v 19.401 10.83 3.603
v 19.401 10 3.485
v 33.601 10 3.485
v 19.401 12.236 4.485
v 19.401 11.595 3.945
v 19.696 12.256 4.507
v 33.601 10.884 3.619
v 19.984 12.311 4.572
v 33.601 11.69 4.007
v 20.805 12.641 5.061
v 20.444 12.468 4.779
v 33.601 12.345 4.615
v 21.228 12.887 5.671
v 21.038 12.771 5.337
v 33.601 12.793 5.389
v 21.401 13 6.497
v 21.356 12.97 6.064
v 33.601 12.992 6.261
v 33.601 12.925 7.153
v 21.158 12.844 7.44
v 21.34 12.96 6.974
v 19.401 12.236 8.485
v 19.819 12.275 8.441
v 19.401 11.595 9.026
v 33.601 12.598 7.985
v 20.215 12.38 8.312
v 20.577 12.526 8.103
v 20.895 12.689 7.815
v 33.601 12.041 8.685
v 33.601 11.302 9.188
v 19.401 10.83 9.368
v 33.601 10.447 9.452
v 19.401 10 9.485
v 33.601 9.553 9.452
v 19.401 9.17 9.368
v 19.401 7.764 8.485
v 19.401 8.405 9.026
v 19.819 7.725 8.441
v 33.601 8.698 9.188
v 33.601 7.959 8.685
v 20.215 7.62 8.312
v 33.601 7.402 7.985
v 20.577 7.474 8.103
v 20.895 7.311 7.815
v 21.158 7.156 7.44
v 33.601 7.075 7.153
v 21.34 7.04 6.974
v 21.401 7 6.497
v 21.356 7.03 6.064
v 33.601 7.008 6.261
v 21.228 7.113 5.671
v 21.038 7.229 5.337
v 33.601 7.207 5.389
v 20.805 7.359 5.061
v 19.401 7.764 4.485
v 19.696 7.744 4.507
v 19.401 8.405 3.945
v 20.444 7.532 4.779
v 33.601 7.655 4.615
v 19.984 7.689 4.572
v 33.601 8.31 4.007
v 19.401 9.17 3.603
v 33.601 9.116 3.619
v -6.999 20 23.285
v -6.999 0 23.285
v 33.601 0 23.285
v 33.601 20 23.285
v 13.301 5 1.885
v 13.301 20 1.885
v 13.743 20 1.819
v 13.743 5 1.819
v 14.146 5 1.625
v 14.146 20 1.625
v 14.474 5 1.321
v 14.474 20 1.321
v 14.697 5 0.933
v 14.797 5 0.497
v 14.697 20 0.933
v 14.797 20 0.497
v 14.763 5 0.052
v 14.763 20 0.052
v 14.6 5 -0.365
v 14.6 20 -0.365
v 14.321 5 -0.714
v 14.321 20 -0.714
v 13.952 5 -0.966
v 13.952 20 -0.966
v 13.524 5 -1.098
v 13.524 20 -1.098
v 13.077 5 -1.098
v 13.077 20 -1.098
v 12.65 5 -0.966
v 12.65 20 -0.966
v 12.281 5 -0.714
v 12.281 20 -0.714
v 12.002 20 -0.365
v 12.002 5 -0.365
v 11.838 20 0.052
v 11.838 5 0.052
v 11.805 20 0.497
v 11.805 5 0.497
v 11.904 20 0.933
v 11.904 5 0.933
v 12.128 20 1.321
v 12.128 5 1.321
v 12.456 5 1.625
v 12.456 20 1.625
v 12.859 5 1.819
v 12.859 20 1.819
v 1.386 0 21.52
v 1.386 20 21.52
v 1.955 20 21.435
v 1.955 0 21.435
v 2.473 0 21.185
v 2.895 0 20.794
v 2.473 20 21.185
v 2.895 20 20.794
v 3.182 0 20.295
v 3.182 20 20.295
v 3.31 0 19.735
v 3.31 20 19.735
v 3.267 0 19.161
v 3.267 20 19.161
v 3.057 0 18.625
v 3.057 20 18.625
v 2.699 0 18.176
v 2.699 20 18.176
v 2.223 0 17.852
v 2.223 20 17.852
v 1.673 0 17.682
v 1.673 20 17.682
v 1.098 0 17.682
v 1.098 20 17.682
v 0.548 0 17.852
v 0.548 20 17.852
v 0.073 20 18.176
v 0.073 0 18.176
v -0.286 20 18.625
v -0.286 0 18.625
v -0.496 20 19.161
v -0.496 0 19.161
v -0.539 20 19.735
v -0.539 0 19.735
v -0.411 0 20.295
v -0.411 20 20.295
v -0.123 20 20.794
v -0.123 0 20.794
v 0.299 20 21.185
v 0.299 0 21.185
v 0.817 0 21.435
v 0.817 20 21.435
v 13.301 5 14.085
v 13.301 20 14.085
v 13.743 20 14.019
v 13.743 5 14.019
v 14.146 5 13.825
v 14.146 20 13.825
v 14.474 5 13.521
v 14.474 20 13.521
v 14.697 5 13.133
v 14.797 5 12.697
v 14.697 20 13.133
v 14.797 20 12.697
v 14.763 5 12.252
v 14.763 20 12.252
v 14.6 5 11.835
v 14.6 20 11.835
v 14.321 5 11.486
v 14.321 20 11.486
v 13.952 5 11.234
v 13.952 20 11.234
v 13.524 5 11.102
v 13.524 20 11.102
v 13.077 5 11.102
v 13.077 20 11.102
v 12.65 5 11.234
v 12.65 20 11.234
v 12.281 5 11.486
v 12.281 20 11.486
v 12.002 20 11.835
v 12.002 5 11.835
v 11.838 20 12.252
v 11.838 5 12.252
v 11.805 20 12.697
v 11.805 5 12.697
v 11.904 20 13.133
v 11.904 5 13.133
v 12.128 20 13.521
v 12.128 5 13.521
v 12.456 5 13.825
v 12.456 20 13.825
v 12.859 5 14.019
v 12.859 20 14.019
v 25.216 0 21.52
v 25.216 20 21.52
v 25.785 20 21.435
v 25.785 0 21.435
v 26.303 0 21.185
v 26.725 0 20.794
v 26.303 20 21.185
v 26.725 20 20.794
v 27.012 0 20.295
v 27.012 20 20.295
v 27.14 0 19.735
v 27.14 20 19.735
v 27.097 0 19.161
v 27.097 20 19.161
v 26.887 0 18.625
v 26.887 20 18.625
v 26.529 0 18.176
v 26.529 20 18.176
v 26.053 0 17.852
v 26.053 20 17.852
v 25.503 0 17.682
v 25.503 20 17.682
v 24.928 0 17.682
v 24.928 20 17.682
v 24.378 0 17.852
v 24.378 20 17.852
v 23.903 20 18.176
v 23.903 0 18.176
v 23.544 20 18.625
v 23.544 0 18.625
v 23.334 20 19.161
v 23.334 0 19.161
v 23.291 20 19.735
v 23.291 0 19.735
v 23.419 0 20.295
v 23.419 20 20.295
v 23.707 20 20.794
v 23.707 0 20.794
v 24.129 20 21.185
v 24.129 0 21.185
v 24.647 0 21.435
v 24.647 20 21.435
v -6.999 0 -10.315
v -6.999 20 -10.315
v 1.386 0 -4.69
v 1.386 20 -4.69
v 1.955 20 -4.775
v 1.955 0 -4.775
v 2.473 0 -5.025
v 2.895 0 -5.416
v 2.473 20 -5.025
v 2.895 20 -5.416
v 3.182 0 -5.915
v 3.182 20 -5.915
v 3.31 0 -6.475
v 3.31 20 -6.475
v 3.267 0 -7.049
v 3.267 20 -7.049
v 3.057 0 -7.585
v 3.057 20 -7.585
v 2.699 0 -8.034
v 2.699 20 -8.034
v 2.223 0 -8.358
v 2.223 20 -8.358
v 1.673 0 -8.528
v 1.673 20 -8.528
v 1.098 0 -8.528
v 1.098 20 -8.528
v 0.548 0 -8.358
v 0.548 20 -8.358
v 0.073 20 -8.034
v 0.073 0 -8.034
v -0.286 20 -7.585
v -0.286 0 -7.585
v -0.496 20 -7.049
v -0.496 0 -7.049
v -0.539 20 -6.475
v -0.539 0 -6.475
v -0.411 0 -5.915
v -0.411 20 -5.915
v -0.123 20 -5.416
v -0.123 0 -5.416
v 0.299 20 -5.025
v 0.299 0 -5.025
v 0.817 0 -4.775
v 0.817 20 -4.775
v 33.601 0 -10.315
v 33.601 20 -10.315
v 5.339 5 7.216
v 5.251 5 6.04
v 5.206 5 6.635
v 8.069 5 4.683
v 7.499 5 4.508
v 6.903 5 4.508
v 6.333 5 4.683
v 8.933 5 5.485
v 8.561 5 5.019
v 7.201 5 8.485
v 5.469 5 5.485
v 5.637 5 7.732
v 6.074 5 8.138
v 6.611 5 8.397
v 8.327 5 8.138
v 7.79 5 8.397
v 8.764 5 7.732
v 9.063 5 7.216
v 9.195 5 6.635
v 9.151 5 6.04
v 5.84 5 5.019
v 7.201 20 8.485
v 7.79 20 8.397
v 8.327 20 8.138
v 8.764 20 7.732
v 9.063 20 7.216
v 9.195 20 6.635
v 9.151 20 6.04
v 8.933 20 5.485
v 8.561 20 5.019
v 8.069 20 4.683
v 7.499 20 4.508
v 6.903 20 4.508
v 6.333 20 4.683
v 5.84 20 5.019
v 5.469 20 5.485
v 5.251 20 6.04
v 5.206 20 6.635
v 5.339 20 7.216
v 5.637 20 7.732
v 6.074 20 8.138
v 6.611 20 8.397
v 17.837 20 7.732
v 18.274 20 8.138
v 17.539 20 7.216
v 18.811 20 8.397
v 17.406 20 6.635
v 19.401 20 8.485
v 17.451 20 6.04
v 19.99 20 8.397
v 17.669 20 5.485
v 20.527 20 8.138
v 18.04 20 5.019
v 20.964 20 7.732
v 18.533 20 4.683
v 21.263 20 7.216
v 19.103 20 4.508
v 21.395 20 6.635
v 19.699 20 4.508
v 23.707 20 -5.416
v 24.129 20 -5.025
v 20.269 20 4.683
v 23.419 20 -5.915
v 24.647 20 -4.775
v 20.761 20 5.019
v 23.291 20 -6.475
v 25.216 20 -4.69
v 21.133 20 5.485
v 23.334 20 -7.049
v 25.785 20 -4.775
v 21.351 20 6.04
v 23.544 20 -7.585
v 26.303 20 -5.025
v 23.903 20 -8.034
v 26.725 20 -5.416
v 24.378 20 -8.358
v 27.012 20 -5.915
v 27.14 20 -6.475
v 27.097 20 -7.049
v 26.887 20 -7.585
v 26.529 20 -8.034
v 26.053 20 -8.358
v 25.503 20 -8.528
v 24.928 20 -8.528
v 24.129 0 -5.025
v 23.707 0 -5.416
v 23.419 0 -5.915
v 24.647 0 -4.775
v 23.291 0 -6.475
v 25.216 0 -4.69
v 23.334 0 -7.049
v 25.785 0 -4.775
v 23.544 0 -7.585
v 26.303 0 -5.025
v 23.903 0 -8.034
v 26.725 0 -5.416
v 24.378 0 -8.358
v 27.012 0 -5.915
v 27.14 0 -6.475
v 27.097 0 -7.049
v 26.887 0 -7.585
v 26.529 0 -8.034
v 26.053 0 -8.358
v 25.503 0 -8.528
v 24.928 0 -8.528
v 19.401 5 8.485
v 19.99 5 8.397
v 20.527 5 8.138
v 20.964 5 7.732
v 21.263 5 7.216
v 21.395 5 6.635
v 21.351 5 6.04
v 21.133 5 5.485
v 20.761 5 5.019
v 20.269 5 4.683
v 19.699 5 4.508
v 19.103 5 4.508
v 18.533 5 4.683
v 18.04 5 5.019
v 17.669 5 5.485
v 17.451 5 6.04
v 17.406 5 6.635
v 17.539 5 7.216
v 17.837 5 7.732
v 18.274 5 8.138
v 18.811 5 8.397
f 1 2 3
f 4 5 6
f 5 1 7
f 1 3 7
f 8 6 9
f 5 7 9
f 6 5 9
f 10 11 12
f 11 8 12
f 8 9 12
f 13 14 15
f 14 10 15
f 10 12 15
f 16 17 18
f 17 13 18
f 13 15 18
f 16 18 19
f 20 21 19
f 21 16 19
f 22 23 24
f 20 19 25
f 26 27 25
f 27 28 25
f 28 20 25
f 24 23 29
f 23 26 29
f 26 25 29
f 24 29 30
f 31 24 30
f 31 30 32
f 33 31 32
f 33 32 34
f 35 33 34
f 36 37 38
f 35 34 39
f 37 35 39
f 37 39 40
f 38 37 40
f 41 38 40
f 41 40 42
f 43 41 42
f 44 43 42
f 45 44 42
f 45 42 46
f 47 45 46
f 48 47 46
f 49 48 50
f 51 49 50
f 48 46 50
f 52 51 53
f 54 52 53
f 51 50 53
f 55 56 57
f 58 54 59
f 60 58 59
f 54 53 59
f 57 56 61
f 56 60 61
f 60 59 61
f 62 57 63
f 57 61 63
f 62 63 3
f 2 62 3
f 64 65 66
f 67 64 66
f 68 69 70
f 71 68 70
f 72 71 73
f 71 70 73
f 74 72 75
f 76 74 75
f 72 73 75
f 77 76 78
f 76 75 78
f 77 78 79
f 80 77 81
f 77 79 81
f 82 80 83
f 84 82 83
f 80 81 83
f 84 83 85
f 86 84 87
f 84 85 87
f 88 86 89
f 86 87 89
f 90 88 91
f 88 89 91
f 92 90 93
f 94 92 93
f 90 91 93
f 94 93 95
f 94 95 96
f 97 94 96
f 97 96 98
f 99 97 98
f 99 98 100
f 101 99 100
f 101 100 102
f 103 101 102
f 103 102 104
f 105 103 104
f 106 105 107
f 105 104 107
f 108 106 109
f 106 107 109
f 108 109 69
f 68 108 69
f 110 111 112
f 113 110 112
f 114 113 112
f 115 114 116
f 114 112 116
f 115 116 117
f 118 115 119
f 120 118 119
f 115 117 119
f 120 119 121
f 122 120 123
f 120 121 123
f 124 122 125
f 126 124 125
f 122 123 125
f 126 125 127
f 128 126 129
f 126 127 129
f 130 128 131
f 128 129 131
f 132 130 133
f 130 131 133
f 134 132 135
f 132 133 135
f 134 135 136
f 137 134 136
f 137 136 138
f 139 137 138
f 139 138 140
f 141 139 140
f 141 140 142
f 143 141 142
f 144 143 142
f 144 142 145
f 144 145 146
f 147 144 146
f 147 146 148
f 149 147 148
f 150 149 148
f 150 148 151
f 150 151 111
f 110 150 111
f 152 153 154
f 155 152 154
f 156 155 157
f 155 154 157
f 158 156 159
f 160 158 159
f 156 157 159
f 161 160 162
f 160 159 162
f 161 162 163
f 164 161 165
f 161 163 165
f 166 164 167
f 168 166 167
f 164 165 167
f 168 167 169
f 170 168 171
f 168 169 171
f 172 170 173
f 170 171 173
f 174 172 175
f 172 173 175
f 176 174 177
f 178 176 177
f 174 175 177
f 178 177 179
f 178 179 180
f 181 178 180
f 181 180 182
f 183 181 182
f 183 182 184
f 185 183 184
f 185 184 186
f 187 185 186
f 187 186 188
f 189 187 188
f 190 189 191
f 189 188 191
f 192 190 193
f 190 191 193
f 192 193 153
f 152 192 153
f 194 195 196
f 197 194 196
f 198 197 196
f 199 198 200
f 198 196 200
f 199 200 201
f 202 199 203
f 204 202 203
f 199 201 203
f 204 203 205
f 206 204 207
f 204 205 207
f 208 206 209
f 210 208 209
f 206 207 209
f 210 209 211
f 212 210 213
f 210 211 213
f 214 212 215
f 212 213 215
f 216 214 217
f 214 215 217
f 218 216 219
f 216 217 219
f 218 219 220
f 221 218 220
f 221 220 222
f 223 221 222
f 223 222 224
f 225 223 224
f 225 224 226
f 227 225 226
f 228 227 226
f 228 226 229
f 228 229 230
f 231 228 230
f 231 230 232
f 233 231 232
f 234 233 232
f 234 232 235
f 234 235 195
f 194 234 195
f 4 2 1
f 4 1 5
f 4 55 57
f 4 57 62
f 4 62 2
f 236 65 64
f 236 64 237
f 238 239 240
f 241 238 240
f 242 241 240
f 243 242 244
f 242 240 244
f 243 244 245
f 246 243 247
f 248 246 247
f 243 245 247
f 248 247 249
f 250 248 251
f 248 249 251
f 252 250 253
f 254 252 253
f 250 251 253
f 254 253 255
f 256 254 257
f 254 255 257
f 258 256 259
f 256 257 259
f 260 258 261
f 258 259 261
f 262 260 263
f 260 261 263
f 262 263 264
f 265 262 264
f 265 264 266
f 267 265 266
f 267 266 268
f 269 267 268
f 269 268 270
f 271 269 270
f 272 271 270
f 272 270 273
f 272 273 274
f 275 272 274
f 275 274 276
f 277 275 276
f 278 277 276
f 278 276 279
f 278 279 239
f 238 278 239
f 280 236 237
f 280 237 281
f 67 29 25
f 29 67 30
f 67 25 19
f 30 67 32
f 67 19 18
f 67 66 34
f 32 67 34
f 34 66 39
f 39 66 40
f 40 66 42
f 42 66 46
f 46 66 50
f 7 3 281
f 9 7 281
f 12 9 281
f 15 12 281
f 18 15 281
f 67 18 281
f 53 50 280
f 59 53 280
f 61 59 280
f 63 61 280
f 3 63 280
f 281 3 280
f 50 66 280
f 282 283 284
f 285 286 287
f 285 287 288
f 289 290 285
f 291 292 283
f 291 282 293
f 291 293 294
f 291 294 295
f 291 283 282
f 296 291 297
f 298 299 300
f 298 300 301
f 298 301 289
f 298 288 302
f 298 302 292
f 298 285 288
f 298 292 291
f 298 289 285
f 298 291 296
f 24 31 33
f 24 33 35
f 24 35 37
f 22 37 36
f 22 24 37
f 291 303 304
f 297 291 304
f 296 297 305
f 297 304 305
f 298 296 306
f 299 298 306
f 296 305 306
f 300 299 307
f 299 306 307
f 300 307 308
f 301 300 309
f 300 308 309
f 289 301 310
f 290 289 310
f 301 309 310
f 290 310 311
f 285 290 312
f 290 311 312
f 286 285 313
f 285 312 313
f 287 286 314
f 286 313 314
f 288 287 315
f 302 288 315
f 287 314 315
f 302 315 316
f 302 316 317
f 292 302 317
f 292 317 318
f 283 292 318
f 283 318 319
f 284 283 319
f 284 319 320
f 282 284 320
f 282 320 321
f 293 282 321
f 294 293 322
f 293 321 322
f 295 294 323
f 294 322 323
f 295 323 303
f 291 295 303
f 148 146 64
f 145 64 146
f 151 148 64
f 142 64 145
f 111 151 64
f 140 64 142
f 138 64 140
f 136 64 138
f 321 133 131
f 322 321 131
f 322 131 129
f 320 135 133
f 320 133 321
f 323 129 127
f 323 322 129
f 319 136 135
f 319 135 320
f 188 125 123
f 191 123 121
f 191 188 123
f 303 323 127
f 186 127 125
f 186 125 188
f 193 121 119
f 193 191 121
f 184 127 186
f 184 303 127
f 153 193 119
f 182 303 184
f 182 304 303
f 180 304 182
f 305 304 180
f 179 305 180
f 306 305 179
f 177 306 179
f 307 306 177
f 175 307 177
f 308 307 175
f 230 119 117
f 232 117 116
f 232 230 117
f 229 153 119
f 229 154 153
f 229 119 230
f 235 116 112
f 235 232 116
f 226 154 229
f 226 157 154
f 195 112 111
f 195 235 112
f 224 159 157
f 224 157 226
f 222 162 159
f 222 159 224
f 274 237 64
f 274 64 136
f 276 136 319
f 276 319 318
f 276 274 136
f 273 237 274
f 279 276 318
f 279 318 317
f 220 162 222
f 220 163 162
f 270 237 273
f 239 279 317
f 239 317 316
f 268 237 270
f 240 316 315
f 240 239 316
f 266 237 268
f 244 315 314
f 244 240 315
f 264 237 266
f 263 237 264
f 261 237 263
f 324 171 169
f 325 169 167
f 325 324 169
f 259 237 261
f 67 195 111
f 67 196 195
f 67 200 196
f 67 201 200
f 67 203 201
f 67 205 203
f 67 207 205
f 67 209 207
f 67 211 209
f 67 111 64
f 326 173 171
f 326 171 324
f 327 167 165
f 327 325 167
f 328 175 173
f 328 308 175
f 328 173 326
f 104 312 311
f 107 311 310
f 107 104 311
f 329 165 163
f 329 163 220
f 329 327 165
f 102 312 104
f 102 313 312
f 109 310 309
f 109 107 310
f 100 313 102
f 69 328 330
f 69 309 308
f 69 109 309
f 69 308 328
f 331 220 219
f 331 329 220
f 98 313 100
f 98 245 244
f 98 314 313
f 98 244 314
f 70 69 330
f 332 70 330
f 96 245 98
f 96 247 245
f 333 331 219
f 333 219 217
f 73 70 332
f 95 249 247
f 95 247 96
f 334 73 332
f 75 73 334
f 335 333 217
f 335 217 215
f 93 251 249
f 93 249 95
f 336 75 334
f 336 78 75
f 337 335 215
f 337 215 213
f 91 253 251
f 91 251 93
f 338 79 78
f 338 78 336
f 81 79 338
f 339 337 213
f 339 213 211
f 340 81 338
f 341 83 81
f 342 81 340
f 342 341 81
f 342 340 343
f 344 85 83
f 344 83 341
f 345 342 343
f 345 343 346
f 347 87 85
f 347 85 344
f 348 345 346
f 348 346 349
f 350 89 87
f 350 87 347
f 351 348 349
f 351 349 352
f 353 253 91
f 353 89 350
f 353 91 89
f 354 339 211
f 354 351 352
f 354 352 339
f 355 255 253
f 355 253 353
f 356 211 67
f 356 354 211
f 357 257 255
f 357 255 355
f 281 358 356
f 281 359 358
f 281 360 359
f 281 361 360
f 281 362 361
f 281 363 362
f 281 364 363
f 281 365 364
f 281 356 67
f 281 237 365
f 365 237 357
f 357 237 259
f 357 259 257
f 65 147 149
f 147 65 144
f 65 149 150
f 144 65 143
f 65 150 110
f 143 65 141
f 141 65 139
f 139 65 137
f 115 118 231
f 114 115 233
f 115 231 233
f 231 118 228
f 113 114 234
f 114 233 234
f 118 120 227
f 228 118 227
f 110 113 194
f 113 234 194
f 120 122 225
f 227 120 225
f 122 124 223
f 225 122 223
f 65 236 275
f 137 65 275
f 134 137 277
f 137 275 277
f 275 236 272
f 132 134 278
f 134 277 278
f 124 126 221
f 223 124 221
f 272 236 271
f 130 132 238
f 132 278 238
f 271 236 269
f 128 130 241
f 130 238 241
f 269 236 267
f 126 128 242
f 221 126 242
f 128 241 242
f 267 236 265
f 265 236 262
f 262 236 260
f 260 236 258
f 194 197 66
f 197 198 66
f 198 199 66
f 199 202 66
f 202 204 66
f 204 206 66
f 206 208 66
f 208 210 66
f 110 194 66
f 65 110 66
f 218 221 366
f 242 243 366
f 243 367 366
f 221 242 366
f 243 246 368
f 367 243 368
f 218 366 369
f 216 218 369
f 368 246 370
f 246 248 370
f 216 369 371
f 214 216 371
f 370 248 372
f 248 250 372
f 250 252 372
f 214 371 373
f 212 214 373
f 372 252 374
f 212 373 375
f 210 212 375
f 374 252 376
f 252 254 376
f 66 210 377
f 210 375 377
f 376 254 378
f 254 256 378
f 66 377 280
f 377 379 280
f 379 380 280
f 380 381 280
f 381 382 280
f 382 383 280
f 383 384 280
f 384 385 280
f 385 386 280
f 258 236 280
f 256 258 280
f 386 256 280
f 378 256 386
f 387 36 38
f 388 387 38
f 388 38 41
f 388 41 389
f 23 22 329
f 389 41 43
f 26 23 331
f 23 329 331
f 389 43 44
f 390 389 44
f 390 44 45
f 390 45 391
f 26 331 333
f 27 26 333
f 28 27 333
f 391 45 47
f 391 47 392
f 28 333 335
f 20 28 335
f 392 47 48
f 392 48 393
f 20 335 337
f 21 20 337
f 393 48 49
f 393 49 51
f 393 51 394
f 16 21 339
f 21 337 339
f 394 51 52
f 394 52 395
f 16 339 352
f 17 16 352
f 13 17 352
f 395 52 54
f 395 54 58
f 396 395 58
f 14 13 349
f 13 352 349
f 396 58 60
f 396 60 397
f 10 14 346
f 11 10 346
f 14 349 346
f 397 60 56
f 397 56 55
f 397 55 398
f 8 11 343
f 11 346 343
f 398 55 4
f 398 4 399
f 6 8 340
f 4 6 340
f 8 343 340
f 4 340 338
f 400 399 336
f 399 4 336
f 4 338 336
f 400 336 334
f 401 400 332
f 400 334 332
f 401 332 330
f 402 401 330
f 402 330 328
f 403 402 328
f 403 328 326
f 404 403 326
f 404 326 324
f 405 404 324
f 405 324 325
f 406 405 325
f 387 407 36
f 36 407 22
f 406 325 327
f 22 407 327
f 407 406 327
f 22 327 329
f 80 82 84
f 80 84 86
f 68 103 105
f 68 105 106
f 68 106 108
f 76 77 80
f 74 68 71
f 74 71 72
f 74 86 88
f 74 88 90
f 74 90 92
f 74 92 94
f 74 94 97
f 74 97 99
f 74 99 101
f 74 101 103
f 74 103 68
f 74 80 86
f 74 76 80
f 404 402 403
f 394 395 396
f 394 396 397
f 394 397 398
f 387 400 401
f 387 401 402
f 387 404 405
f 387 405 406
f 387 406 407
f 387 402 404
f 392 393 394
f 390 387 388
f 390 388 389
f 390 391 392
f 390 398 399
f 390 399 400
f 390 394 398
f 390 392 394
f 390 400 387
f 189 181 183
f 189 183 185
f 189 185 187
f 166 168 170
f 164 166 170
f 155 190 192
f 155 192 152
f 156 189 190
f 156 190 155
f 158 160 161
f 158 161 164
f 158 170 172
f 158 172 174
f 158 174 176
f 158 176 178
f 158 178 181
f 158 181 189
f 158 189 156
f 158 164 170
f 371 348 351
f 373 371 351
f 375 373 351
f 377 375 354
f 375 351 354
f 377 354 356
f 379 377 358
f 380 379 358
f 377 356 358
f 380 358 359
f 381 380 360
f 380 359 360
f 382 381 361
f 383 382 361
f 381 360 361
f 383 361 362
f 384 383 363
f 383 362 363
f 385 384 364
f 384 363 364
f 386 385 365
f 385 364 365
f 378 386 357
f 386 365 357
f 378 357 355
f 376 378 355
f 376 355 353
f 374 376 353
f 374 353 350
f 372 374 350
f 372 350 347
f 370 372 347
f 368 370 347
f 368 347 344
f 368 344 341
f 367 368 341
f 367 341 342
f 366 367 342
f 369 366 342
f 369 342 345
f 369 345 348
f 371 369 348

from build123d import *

# Parameters (mm, degrees)
SKETCH1_W       = 40.6
SKETCH1_H       = 33.6
EXTRUDE6_DEPTH  = 20
SKETCH7_R       = 1.93
EXTRUDE12_DEPTH = 46.510692117
SKETCH12_R      = 2
SKETCH12_R_2    = 1.5
EXTRUDE13_DEPTH = 15
SKETCH13_R      = 3
EXTRUDE14_DEPTH = 14.2


with BuildPart() as part:
    # Sketch1 → Extrude6 (new body)
    with BuildSketch(Plane(origin=(0, 0, 0), x_dir=(1, 0, 0), z_dir=(0, 1, 0))):
        with Locations((13.300799804, -6.485389185)):
            Rectangle(SKETCH1_W, SKETCH1_H)
    extrude(amount=EXTRUDE6_DEPTH)

    # Sketch7 → Extrude12 (cut, through all)
    with BuildSketch(Plane(origin=(0, 20, 0), x_dir=(-1, 0, 0), z_dir=(0, 1, 0))):
        with Locations(Location((-1.385799804, -6.619610815, 0), (0, 0, 90))):
            Circle(SKETCH7_R)
        with Locations(Location((-25.215799804, -6.619610815, 0), (0, 0, 90))):
            Circle(SKETCH7_R)
        with Locations(Location((-1.385799804, 19.590389185, 0), (0, 0, 90))):
            Circle(SKETCH7_R)
        with Locations(Location((-25.215799804, 19.590389185, 0), (0, 0, 90))):
            Circle(SKETCH7_R)
    extrude(amount=-EXTRUDE12_DEPTH, mode=Mode.SUBTRACT)

    # Sketch12 → Extrude13 (cut)
    with BuildSketch(Plane(origin=(0, 20, 0), x_dir=(1, 0, 0), z_dir=(0, 1, 0))):
        with Locations(Location((7.200799804, -6.485389185, 0), (0, 0, 270))):
            Circle(SKETCH12_R)
        with Locations(Location((13.300799804, -0.385389185, 0), (0, 0, 270))):
            Circle(SKETCH12_R_2)
        with Locations(Location((19.400799804, -6.485389185, 0), (0, 0, 270))):
            Circle(SKETCH12_R)
        with Locations(Location((13.300799804, -12.585389185, 0), (0, 0, 270))):
            Circle(SKETCH12_R_2)
    extrude(amount=-EXTRUDE13_DEPTH, mode=Mode.SUBTRACT)

    # Sketch13 → Extrude14 (cut)
    with BuildSketch(Plane(origin=(33.600799804, 0, 0), x_dir=(0, 0, -1), z_dir=(1, 0, 0))):
        with Locations((-6.485389185, 10)):
            Circle(SKETCH13_R)
    extrude(amount=-EXTRUDE14_DEPTH, mode=Mode.SUBTRACT)


solid = part.part
